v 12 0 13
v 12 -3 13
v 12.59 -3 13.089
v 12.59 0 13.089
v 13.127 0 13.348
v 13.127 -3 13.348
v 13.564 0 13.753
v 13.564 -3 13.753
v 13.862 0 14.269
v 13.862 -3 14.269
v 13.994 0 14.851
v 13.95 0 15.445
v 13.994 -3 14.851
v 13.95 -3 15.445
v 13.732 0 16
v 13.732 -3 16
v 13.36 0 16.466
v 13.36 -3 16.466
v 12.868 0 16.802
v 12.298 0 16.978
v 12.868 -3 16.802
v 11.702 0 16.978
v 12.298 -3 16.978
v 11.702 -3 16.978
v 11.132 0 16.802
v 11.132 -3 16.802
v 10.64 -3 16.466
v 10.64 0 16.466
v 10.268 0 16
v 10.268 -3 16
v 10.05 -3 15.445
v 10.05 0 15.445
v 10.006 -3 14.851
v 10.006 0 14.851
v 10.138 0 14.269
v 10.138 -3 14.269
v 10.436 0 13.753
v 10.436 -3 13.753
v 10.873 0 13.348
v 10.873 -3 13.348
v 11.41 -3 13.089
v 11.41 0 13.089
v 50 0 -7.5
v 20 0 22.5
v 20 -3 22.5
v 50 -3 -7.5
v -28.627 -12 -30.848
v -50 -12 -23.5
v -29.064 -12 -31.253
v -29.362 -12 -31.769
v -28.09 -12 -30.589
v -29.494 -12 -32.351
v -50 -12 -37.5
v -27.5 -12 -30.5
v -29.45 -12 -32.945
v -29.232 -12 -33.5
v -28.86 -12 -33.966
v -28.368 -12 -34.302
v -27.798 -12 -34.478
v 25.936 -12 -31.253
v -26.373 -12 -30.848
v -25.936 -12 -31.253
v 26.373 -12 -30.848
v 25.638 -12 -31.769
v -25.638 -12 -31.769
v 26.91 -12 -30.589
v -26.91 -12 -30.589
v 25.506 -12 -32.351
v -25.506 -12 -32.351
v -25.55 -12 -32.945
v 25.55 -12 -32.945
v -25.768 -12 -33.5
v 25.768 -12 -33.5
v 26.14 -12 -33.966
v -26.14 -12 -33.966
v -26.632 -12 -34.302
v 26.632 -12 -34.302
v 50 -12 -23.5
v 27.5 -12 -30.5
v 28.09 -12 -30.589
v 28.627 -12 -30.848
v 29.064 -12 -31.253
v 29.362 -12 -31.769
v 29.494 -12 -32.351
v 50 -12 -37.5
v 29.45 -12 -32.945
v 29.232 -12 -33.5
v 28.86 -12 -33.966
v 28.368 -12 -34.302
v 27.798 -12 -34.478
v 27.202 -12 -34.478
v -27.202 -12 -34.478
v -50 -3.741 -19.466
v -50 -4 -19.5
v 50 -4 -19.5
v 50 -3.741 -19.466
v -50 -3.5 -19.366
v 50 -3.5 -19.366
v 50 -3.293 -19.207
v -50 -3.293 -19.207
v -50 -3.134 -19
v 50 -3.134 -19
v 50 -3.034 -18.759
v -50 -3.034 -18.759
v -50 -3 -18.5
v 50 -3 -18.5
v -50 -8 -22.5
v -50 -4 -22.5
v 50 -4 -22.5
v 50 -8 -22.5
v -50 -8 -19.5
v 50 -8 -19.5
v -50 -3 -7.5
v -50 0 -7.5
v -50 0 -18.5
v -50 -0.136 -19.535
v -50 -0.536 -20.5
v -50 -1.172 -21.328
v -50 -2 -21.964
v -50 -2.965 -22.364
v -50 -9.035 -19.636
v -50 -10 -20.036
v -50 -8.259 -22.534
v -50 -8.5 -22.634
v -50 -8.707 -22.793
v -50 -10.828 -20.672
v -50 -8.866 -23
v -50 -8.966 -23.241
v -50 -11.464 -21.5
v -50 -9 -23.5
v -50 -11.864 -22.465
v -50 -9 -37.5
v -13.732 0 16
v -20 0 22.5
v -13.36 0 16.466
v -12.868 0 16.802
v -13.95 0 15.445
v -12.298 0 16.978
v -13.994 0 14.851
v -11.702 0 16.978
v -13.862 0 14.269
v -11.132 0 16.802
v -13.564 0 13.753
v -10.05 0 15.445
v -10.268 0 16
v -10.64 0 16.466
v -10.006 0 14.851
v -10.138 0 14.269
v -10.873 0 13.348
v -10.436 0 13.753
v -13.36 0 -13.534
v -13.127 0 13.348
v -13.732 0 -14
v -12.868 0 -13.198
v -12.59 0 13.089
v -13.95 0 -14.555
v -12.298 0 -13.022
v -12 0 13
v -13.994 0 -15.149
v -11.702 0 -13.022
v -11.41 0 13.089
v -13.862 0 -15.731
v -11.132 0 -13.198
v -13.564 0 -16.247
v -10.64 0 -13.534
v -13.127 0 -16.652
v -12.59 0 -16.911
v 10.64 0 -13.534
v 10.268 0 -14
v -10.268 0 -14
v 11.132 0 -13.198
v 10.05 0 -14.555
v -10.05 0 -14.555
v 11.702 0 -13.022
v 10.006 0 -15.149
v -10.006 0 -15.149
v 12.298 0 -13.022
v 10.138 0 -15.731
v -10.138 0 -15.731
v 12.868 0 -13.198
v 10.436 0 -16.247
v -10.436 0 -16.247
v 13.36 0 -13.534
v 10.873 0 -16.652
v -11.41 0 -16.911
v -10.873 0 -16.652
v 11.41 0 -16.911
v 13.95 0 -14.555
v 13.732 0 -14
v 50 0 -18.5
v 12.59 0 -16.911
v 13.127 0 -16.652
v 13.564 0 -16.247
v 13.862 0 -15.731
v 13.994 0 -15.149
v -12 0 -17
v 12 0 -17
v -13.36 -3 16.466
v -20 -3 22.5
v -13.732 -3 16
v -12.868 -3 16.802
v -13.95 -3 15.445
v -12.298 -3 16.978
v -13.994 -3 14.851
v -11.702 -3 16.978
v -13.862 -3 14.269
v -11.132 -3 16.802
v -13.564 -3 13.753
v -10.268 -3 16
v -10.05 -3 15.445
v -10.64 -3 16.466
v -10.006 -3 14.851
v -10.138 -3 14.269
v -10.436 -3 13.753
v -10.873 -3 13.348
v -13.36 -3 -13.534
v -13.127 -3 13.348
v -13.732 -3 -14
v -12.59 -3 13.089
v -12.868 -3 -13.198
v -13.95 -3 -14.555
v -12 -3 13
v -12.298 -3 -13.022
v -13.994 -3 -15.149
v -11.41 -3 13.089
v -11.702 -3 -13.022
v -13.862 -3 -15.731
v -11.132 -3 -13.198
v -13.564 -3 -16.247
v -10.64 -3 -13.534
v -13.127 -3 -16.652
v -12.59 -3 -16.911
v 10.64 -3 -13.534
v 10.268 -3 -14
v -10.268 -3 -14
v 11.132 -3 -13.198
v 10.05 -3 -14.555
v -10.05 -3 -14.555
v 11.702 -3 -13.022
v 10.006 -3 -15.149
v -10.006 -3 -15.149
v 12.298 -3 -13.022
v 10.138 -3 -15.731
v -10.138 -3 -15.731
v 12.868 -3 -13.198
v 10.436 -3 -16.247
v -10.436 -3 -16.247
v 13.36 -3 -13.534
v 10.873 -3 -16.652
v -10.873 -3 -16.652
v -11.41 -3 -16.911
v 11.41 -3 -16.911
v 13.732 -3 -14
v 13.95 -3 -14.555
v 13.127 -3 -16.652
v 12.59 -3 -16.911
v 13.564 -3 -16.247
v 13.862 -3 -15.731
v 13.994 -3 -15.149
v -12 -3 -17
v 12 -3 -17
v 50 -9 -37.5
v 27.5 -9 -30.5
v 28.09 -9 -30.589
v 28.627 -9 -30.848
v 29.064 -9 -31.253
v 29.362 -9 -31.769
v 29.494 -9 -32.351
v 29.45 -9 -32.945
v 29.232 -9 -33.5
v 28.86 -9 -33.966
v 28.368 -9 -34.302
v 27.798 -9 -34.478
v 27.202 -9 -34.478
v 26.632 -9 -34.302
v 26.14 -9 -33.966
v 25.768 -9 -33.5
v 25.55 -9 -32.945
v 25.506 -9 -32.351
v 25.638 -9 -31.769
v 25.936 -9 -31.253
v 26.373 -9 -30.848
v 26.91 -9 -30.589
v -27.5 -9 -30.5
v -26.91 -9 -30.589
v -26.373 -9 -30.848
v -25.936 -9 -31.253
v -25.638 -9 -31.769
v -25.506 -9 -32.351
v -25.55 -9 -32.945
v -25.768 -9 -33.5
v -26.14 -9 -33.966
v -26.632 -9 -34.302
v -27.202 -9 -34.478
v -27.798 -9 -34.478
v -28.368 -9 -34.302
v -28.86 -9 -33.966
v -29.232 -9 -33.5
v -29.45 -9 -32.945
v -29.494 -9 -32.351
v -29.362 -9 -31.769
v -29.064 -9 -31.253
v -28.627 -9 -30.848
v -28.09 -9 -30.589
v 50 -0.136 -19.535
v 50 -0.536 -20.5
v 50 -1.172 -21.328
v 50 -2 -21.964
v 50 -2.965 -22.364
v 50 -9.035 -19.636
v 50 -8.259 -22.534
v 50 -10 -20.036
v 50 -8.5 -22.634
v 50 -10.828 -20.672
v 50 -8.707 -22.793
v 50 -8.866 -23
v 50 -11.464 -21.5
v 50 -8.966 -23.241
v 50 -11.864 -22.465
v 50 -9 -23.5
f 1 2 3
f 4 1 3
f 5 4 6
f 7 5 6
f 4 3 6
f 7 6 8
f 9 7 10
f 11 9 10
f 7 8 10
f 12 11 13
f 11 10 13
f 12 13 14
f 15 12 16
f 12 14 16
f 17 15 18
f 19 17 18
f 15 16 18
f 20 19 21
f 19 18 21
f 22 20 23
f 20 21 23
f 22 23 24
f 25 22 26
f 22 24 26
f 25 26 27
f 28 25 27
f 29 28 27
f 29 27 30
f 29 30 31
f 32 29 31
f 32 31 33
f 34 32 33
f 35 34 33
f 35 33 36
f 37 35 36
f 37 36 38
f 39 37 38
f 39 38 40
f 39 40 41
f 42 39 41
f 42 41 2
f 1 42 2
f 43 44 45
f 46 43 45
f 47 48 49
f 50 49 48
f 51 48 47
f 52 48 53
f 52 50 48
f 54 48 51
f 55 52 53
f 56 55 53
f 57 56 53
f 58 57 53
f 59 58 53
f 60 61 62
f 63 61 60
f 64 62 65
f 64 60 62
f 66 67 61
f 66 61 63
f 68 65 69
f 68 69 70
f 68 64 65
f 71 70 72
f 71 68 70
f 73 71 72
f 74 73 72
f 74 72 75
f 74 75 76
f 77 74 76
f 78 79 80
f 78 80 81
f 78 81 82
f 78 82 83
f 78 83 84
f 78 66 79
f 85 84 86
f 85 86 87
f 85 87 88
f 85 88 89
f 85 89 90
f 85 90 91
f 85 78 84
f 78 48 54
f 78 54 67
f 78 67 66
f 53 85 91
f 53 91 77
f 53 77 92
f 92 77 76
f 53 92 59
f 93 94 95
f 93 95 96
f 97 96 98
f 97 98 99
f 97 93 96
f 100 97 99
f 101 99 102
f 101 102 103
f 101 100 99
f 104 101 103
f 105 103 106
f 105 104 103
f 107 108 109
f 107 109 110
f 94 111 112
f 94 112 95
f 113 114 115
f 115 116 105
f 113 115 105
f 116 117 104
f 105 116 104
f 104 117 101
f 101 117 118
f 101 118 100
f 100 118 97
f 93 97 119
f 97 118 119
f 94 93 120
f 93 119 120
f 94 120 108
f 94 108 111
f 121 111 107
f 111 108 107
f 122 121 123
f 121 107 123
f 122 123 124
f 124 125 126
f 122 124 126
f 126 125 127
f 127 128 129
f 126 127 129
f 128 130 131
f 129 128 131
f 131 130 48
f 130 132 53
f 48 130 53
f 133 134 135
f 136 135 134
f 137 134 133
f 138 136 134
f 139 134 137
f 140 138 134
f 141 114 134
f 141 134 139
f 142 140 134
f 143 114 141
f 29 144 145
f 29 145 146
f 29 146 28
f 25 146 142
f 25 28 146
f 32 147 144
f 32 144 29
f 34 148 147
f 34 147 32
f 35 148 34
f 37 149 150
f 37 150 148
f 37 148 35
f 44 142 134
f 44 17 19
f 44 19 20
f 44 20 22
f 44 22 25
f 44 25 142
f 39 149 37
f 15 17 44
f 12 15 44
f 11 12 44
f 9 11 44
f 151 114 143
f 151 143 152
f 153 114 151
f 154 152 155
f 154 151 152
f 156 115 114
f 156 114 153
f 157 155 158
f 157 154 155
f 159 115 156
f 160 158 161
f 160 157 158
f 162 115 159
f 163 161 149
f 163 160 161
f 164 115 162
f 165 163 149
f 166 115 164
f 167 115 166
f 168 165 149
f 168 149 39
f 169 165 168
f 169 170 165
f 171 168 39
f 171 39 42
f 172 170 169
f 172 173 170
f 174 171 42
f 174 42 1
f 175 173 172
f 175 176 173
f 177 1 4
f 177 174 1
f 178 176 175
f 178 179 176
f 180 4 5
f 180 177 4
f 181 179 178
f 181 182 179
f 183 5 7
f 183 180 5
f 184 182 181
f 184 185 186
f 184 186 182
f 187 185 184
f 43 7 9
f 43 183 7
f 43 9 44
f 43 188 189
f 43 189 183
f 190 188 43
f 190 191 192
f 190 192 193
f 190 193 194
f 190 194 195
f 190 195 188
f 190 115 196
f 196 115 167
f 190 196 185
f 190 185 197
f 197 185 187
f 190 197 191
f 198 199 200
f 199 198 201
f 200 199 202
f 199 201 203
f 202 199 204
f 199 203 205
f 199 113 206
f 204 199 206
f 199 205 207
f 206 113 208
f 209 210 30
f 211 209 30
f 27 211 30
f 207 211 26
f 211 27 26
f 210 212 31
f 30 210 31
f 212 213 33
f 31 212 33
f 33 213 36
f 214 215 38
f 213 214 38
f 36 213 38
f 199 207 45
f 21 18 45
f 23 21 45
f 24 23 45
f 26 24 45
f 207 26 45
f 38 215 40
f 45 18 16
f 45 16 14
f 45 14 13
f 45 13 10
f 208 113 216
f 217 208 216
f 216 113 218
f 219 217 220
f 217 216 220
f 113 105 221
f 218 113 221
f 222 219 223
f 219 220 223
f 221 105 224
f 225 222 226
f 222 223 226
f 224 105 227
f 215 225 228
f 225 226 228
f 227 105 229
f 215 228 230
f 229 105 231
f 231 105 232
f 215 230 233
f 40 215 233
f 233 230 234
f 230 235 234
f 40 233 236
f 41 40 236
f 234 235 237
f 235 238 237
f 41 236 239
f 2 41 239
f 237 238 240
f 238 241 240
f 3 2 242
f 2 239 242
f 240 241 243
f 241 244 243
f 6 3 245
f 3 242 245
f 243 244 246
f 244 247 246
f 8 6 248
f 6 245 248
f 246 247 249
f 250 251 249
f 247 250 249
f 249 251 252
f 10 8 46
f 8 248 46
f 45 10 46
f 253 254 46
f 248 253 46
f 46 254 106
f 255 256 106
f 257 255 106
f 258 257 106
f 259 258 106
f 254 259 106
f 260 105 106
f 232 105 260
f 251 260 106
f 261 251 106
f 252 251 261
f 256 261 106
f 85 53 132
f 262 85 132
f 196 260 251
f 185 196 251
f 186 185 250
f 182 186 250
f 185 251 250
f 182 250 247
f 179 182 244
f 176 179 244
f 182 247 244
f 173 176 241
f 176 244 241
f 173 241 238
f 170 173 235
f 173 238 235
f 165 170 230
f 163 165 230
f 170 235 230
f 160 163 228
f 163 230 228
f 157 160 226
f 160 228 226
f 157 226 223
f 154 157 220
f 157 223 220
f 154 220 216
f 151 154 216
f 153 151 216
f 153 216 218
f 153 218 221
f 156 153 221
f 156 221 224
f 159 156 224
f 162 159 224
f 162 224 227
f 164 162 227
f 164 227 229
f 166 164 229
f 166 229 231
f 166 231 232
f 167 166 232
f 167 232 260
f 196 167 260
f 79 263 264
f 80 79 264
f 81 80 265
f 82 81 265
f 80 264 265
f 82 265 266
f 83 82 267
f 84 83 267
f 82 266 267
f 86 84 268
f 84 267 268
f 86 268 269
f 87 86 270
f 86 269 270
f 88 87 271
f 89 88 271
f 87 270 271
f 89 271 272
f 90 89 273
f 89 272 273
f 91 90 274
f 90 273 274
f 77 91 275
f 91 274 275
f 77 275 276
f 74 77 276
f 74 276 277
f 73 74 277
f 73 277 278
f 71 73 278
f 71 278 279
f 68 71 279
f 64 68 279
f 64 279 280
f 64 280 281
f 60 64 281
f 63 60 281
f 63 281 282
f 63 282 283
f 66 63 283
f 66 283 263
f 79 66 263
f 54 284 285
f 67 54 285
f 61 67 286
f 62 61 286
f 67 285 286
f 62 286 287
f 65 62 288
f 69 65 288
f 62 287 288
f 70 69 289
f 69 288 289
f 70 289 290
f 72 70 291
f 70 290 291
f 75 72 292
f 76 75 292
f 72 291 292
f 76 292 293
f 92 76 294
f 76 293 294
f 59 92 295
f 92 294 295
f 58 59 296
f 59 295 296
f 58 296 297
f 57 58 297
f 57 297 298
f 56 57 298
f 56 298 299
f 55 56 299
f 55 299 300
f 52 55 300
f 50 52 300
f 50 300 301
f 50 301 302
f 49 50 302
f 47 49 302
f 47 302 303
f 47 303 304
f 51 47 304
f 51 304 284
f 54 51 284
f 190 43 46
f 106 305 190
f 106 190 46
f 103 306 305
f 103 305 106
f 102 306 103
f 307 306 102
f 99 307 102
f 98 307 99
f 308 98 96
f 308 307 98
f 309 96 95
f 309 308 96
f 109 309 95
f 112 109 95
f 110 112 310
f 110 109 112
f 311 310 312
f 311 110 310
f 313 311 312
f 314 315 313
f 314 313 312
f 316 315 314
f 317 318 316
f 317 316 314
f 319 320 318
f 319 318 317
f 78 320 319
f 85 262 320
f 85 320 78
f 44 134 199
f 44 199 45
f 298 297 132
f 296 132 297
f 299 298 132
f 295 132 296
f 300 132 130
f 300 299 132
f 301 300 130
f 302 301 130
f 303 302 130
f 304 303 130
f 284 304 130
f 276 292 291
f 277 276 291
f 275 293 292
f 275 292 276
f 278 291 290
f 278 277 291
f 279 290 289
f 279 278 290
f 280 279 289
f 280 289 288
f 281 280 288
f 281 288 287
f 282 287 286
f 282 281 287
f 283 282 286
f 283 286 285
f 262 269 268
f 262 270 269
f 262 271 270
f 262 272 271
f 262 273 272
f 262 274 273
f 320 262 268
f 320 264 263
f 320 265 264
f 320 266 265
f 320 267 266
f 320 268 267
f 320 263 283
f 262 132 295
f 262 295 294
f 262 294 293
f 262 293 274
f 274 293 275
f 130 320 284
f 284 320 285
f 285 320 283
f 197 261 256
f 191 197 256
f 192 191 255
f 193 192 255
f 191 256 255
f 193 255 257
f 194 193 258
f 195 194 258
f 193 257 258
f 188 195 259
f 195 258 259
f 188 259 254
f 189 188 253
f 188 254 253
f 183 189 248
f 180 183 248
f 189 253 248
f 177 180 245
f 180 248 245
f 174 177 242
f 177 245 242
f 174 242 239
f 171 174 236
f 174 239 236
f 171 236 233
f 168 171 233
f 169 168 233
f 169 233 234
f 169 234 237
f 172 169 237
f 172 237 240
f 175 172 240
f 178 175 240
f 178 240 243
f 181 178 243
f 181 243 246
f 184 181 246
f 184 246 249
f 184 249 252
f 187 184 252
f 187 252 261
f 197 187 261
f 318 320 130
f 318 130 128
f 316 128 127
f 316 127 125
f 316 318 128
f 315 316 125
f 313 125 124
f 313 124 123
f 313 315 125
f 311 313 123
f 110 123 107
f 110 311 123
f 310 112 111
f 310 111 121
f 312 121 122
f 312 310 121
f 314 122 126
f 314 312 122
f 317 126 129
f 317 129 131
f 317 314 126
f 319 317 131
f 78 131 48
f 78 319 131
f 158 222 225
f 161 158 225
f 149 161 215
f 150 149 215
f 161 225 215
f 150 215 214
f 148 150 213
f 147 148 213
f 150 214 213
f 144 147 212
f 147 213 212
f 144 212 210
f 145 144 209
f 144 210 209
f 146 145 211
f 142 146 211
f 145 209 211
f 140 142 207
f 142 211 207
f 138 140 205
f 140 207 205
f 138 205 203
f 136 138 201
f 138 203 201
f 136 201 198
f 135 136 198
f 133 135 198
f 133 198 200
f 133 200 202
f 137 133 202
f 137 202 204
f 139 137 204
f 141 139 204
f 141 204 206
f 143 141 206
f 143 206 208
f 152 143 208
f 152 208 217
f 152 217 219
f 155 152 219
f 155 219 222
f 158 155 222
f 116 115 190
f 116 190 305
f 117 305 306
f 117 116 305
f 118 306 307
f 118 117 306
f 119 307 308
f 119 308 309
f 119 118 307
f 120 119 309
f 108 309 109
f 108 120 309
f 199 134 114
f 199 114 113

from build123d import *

# Parameters (mm, degrees)
SKETCH1_W                    = 100
SKETCH1_H                    = 45
BASE_FLANGE1_DEPTH           = 3
EDGE_FLANGE1_STRIP_W         = 14
EDGE_FLANGE1_STRIP_H         = 3
EDGE_FLANGE1_STRIP_CUT_DEPTH = 100
EDGE_FLANGE1_DEPTH           = 100
EDGE_FLANGE2_STRIP_W         = 14
EDGE_FLANGE2_STRIP_H         = 3
EDGE_FLANGE2_STRIP_CUT_DEPTH = 100
EDGE_FLANGE2_DEPTH           = 100
SKETCH12_R                   = 2
CUT_EXTRUDE1_DEPTH           = 64.144675152
F_4_0MM_DOWEL_HOLE1_D        = 4
F_4_0MM_DOWEL_HOLE1_DEPTH    = 12.4
F_4_0MM_DOWEL_HOLE1_TIP      = 1.201721238
CHAMFER1_SIZE                = 30


# Sheet-metal steps are written as plain solids
with BuildPart() as part:
    # Sketch1 → Base-Flange1 (new body)
    with BuildSketch(Plane(origin=(0, 0, 0), x_dir=(1, 0, 0), z_dir=(0, 1, 0))):
        Rectangle(SKETCH1_W, SKETCH1_H)
    extrude(amount=-BASE_FLANGE1_DEPTH)

    # Edge-Flange1 strip (across the edge) → Edge-Flange1 strip cut (cut)
    with BuildSketch(Plane(origin=(-50, -3, -22.5), x_dir=(0, 0, 1), z_dir=(1, 0, 0))):
        with Locations((-3, -1.5)):
            Rectangle(EDGE_FLANGE1_STRIP_W, EDGE_FLANGE1_STRIP_H)
    extrude(amount=EDGE_FLANGE1_STRIP_CUT_DEPTH, mode=Mode.SUBTRACT)

    # Edge-Flange1 section (across the edge) → Edge-Flange1 (add)
    with BuildSketch(Plane(origin=(-50, -3, -22.5), x_dir=(0, 0, 1), z_dir=(1, 0, 0))):
        with BuildLine():
            Line((0, 1), (0, 9))
            Line((0, 9), (3, 9))
            Line((3, 9), (3, 1))
            ThreePointArc((3, 1), (3.292893219, 0.292893219), (4, 0))
            Line((4, 0), (4, -3))
            ThreePointArc((4, -3), (1.171572875, -1.828427125), (0, 1))
        make_face()
    extrude(amount=EDGE_FLANGE1_DEPTH)

    # Edge-Flange2 strip (across the edge) → Edge-Flange2 strip cut (cut)
    with BuildSketch(Plane(origin=(50, -12, -22.5), x_dir=(0, 1, 0), z_dir=(-1, 0, 0))):
        with Locations((-3, -1.5)):
            Rectangle(EDGE_FLANGE2_STRIP_W, EDGE_FLANGE2_STRIP_H)
    extrude(amount=EDGE_FLANGE2_STRIP_CUT_DEPTH, mode=Mode.SUBTRACT)

    # Edge-Flange2 section (across the edge) → Edge-Flange2 (add)
    with BuildSketch(Plane(origin=(50, -12, -22.5), x_dir=(0, 1, 0), z_dir=(-1, 0, 0))):
        with BuildLine():
            Line((0, 1), (0, 15))
            Line((0, 15), (3, 15))
            Line((3, 15), (3, 1))
            ThreePointArc((3, 1), (3.292893219, 0.292893219), (4, 0))
            Line((4, 0), (4, -3))
            ThreePointArc((4, -3), (1.171572875, -1.828427125), (0, 1))
        make_face()
    extrude(amount=EDGE_FLANGE2_DEPTH)

    # Sketch12 → Cut-Extrude1 (cut, through all)
    with BuildSketch(Plane(origin=(0, -9, 0), x_dir=(1, 0, 0), z_dir=(0, 1, 0))):
        with Locations(Location((-27.5, 32.5, 0), (0, 0, 270))):
            Circle(SKETCH12_R)
        with Locations(Location((27.5, 32.5, 0), (0, 0, 270))):
            Circle(SKETCH12_R)
    extrude(amount=-CUT_EXTRUDE1_DEPTH, mode=Mode.SUBTRACT)

    # Ø4.0mm Dowel Hole1
    with Locations(Plane(origin=(12, 0, -15), x_dir=(0, 0, 1), z_dir=(0, 1, 0))):
        with Locations((0, 0), (30, 0), (30, -24), (0, -24)):
            Hole(F_4_0MM_DOWEL_HOLE1_D / 2, depth=F_4_0MM_DOWEL_HOLE1_DEPTH)
            with Locations((0, 0, -(F_4_0MM_DOWEL_HOLE1_DEPTH + F_4_0MM_DOWEL_HOLE1_TIP / 2))):  # 118° drill point
                Cone(0, F_4_0MM_DOWEL_HOLE1_D / 2, F_4_0MM_DOWEL_HOLE1_TIP, mode=Mode.SUBTRACT)

    # Chamfer1
    chamfer1_edges = [part.edges().sort_by_distance(p)[0] for p in [
        (50, -1.5, 22.5),
        (-50, -1.5, 22.5),
    ]]
    chamfer(chamfer1_edges, length=CHAMFER1_SIZE)


solid = part.part
